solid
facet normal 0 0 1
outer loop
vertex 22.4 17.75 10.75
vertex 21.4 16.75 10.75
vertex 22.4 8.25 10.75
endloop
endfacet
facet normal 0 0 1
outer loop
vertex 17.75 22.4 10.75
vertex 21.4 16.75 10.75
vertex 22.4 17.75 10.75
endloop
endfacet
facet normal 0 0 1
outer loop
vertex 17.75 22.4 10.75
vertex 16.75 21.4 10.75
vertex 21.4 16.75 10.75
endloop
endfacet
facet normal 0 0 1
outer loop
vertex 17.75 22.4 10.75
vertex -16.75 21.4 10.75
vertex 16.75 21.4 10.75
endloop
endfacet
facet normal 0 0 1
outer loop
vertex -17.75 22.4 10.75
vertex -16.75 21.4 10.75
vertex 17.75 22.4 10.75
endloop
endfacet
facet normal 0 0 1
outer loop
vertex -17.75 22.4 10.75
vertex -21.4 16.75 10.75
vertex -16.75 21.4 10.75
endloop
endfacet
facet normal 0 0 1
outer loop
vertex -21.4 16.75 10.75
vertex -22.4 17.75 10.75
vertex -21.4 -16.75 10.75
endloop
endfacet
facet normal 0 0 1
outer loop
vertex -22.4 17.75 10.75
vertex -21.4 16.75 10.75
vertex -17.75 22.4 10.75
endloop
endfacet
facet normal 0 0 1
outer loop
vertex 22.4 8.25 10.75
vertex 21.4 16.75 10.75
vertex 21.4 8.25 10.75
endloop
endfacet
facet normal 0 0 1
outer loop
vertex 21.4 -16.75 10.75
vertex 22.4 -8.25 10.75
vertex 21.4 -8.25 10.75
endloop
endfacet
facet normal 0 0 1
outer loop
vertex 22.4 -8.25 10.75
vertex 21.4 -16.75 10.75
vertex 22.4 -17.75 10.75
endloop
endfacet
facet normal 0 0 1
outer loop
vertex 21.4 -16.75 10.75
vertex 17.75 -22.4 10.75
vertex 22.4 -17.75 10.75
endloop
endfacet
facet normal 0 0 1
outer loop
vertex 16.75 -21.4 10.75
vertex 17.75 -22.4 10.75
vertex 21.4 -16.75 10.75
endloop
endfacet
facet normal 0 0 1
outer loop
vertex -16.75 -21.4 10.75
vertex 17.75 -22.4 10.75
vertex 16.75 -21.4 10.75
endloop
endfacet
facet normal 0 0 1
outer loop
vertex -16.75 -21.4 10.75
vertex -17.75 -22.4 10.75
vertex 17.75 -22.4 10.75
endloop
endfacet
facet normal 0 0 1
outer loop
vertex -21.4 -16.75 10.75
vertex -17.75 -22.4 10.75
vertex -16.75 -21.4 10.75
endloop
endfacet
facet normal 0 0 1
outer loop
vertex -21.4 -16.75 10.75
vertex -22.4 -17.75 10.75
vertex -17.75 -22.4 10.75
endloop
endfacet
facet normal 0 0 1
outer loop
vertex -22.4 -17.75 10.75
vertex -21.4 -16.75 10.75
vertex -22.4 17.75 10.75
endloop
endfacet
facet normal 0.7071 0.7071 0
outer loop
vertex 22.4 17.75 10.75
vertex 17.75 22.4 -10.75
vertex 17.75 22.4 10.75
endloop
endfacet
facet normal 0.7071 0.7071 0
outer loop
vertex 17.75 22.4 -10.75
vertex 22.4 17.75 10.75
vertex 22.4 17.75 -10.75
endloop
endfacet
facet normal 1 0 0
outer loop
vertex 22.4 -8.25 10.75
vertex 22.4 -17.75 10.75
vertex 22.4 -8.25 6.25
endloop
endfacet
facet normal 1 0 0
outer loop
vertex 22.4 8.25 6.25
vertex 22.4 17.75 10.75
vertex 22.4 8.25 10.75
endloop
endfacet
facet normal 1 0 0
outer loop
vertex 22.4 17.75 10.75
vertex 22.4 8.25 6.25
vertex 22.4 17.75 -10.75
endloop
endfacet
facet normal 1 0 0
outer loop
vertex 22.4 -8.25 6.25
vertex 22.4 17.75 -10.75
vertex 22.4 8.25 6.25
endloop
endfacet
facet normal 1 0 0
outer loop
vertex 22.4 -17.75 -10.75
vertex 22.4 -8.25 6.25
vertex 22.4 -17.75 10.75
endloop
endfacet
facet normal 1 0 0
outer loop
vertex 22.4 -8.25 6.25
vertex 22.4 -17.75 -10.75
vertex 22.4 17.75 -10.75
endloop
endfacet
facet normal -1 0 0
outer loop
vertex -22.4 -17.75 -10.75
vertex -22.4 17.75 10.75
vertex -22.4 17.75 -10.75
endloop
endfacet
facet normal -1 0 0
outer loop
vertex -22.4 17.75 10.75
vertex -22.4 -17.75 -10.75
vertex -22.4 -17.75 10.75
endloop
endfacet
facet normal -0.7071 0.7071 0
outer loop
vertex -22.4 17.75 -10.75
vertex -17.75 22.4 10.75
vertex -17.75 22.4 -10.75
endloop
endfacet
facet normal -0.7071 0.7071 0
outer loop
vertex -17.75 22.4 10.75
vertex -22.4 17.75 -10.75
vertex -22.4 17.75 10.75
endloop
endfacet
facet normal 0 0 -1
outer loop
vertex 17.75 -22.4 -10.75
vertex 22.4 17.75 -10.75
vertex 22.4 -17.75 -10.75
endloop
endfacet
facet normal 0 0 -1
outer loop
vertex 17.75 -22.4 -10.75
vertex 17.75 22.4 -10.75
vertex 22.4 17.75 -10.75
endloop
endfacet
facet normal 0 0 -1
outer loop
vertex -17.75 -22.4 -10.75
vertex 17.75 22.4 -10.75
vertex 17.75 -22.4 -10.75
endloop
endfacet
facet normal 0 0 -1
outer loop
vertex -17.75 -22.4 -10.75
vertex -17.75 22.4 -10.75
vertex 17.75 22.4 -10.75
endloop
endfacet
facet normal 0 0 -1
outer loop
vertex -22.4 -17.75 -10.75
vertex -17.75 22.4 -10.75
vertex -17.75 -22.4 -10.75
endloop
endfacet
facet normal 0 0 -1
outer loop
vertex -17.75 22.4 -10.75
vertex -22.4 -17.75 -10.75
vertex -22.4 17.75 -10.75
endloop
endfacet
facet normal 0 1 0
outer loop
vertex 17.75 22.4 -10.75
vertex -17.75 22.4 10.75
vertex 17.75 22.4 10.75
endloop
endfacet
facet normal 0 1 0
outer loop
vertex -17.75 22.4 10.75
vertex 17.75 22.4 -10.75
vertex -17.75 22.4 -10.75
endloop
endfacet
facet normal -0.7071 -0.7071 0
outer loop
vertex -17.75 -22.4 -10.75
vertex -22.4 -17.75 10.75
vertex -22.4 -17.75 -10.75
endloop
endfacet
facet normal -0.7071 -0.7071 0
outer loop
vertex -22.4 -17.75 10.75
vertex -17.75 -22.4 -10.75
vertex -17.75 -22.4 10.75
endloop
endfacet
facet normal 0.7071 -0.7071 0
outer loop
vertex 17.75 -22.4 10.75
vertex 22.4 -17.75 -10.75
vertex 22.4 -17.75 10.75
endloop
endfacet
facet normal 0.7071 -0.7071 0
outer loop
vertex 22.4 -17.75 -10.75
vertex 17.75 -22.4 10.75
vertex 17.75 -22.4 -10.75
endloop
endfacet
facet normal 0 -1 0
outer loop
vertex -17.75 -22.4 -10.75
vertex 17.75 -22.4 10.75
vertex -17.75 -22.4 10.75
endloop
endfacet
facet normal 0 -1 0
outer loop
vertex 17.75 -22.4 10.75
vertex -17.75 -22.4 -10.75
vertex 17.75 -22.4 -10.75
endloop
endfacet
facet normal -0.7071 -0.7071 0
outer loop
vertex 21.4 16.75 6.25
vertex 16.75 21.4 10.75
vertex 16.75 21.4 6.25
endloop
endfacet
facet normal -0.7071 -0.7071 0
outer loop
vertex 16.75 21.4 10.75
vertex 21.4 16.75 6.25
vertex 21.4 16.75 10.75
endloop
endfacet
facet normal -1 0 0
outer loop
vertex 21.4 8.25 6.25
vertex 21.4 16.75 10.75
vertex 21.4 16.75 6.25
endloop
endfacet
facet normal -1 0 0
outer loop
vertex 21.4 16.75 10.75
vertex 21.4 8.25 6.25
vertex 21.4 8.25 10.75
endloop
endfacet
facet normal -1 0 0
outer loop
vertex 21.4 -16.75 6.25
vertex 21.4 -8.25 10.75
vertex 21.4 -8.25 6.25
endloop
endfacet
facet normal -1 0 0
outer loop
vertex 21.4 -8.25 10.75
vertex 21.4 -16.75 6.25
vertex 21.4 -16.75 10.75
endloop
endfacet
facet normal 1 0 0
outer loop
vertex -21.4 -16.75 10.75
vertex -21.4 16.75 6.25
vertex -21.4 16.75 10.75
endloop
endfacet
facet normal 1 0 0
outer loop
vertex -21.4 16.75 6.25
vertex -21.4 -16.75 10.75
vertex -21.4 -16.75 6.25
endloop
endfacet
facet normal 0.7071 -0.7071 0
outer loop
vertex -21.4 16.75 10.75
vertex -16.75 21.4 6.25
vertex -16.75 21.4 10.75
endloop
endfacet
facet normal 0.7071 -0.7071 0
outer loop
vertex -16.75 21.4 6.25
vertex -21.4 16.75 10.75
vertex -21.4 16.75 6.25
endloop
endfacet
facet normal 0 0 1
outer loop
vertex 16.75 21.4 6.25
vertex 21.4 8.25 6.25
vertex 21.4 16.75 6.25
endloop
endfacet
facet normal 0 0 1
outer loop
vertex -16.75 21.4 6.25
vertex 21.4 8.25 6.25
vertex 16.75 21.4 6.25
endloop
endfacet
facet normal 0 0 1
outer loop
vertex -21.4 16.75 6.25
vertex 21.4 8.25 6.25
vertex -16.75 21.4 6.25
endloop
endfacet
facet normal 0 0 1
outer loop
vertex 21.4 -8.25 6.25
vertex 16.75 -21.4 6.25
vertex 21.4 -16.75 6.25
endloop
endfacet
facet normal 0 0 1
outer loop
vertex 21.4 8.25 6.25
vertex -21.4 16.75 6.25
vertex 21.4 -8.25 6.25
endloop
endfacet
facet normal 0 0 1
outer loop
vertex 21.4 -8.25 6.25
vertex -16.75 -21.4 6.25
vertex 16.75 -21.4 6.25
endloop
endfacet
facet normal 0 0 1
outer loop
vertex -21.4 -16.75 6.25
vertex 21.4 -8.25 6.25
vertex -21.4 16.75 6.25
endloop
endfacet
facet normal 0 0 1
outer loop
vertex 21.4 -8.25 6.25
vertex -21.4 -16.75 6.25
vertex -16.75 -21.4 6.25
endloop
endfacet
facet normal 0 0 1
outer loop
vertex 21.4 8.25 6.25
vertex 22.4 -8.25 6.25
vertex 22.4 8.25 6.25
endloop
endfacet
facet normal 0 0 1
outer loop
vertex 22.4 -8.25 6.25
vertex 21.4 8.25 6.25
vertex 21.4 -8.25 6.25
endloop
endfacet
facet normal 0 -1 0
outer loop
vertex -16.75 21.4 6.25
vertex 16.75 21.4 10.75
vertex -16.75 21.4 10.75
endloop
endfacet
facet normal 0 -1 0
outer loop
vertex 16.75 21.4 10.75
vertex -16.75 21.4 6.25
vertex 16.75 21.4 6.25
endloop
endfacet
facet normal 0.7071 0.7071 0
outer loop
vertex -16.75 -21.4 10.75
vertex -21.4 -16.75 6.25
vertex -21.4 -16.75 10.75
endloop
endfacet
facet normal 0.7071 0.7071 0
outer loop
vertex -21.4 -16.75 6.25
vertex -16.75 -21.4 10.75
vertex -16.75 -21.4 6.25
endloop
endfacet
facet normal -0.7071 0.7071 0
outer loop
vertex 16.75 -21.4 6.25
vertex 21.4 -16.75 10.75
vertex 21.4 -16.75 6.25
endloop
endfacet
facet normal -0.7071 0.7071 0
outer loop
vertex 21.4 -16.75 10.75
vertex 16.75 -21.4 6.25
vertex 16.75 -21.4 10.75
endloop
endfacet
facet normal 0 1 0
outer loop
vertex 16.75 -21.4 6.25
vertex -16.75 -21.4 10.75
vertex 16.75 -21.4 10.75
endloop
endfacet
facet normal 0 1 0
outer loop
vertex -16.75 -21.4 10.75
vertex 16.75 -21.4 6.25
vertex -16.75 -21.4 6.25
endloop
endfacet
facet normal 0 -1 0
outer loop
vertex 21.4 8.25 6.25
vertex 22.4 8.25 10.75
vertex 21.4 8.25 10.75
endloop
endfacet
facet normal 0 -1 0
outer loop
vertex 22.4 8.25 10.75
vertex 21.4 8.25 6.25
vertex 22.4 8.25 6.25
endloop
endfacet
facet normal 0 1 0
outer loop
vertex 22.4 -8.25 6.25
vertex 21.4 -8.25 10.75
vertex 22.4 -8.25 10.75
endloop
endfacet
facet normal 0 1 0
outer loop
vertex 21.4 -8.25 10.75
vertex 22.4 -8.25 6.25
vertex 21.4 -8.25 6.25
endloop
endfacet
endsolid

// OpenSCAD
/* [Support Dimensions] */
// - Support/padding height (excluding the skirt height)
support_height = 17.5;
// - Width of the motor - 42.3mm for NEMA 17
width = 42.3; // NEMA 17s are 42.3 x 42.3 x motor_height
// - Chamfer width of the motor. Set it to the same as width if the motor body isn't chamfered
chamfer_width = 33;

/* [Skirt Dimensions] */
// - Skirt Height
skirt_height = 4;
// - Thickness in addition to motor dimensions, which primarily shows up as the skirt thickness in the model
thickness = 1;

/* [Connector Dimensions] */
// - Width of the motor connector
connector_width = 16;

/* [Tolerances] */
// - Additional spacing for holes, to compensate for material shrinkage after printing
shrink_buffer = 0.5;
// - Buffer to avoid zero thickness planes in intersections and differences. Doesn't have to be customized in most cases.
hole_buffer = 1; // Hole shapes need to be slightly bigger than the objects they're cutting through

difference(){
    motor_support(width + shrink_buffer, chamfer_width + shrink_buffer, support_height, skirt_height, thickness);
    translate([width / 2, 0, support_height / 2]) {
        connector_hole(connector_width + shrink_buffer, thickness, skirt_height);
    };
}

module connector_hole(width, thickness, height) {
    cube([(thickness * 2) + hole_buffer, width, height + hole_buffer], center = true);
}

module motor_support(width, chamfer_width, support_height, skirt_height, thickness) {
    difference() {
        motor_body(width + (thickness * 2), chamfer_width + (thickness * 2), support_height + skirt_height);
        translate([0, 0, support_height / 2]) {
            motor_body(width, chamfer_width, skirt_height + hole_buffer);
        };
    };
}

module motor_body(width, chamfer_width, height) {
    hull() {
        cube([width, chamfer_width, height], center = true);
        rotate([0, 0, 90]){
            cube([width, chamfer_width, height], center = true);
        };
    };
}
